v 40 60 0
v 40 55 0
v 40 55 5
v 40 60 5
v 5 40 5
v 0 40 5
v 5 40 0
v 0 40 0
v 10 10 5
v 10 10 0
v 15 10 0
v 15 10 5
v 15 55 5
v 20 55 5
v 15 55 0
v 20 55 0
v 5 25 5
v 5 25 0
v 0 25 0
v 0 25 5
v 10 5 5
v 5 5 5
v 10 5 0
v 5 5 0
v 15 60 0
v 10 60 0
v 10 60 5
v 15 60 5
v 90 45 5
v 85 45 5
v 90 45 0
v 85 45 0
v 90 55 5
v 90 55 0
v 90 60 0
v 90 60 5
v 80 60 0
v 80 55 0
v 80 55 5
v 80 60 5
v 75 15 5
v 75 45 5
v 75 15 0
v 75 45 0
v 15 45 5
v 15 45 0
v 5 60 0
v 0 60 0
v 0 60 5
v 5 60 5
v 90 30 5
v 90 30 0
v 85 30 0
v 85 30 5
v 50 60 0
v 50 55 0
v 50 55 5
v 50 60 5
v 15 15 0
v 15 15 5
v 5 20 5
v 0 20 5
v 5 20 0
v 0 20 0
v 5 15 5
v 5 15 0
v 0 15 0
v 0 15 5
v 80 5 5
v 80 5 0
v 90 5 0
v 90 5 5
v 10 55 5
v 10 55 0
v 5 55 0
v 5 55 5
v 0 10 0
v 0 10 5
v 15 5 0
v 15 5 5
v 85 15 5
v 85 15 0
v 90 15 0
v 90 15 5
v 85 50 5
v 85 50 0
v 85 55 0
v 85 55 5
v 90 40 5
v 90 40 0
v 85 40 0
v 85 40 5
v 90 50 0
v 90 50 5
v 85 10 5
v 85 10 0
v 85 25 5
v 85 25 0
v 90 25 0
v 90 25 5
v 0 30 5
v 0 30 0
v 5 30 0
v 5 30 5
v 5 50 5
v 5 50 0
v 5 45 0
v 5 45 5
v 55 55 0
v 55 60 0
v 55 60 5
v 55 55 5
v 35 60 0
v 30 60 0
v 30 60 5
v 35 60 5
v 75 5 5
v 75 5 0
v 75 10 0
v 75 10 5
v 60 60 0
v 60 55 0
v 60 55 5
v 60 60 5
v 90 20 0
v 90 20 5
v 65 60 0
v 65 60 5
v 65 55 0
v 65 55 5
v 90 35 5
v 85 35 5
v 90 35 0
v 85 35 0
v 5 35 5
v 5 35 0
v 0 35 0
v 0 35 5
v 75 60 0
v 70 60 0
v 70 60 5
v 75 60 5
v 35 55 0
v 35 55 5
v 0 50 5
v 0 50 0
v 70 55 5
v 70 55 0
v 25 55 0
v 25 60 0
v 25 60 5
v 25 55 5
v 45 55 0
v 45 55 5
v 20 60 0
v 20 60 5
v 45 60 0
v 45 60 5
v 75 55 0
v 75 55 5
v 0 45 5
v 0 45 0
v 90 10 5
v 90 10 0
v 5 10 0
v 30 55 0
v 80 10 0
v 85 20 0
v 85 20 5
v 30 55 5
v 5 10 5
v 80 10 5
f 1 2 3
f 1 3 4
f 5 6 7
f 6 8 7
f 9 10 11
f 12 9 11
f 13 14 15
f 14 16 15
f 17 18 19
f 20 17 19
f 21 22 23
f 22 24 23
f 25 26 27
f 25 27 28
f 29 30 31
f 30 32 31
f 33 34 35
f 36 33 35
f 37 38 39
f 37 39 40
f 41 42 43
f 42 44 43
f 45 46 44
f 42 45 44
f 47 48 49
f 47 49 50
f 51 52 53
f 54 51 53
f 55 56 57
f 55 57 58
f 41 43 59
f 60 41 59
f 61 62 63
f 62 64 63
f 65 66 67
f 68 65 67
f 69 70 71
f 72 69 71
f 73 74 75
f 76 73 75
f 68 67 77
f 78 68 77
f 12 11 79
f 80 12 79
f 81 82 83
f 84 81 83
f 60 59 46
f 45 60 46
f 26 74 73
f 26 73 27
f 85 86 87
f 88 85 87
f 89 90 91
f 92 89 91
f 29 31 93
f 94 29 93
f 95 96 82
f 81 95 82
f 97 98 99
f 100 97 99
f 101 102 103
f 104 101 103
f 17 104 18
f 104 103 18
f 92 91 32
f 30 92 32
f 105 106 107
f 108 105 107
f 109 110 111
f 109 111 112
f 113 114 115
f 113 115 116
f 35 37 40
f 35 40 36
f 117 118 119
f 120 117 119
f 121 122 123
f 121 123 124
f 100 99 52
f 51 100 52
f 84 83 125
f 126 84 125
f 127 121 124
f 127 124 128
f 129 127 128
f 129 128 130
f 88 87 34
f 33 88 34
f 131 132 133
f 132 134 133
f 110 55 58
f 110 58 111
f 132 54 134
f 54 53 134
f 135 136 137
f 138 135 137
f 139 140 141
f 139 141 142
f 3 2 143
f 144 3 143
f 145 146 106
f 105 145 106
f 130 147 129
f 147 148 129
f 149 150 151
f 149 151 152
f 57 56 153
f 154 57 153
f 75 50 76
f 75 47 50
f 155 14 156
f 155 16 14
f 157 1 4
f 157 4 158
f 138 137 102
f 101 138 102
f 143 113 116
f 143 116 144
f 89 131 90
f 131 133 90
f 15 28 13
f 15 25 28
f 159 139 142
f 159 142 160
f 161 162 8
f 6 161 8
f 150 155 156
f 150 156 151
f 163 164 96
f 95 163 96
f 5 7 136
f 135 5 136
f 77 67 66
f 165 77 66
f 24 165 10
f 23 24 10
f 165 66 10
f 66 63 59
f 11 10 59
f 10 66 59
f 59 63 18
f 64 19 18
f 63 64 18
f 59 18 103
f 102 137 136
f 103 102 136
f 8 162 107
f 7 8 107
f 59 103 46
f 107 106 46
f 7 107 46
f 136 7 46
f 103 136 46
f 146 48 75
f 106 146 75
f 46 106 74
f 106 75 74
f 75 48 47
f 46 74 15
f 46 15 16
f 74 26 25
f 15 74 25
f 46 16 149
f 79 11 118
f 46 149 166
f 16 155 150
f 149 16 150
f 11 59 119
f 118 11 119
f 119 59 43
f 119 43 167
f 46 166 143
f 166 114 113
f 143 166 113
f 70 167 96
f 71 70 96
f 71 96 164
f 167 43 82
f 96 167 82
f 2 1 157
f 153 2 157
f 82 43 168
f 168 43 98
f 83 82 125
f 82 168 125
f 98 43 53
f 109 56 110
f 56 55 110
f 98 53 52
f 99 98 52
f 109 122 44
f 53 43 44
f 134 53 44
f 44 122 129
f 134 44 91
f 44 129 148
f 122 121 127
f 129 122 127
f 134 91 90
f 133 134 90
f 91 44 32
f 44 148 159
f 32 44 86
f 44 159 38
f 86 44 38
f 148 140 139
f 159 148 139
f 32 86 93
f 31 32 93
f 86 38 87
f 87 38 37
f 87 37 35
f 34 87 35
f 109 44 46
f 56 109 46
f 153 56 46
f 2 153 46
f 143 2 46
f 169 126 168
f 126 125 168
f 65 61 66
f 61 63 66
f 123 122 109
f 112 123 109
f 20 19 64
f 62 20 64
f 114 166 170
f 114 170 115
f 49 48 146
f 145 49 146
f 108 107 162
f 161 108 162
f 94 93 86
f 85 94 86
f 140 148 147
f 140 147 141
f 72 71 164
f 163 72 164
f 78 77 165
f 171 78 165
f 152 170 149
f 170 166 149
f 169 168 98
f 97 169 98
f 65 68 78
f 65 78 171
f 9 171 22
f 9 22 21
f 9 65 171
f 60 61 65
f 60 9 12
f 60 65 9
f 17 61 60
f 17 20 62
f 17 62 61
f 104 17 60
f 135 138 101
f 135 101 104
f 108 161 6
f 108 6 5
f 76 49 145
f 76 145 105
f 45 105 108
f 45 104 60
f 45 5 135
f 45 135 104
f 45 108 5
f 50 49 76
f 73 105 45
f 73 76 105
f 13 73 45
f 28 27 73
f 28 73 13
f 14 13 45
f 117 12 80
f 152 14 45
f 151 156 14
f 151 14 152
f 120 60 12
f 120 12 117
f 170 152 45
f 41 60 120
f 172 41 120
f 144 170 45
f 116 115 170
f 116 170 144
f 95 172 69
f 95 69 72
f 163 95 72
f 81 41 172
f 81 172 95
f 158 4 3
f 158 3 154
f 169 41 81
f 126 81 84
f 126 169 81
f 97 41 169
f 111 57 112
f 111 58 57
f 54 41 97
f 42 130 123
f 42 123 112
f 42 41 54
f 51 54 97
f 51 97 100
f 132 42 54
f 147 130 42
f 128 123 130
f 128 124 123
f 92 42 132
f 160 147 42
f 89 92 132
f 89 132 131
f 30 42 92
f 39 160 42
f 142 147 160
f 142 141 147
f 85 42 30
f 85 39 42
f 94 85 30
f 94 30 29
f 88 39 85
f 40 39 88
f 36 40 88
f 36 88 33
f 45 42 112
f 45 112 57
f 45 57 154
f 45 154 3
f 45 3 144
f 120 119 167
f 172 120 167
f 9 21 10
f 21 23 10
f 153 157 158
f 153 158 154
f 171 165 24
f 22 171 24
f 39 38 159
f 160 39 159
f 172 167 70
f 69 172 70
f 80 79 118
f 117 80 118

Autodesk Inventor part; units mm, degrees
ref_plane "YZ Plane" through (0, 0, 0) normal (1, 0, 0) x (0, 1, 0)
ref_plane "XZ Plane" through (0, 0, 0) normal (0, 1, 0) x (-1, 0, 0)
ref_plane "XY Plane" through (0, 0, 0) normal (0, 0, 1) x (1, 0, 0)
sketch "Sketch1" plane through (0, 0, 0) normal (0, 0, 1) x (1, 0, 0)
  line L0 (5, 5) -> (85, 5)
  line L1 (85, 5) -> (85, 55)
  line L2 (85, 55) -> (5, 55)
  line L3 (5, 55) -> (5, 5)
  line L4 (0, 60) -> (5, 60)
  line L5 (5, 60) -> (5, 55)
  line L6 (5, 55) -> (0, 55)
  line L7 (0, 55) -> (0, 60)
  line L8 (0, 50) -> (5, 50)
  line L9 (5, 50) -> (5, 55)
  line L10 (5, 55) -> (0, 55)
  line L11 (0, 55) -> (0, 50)
  line L12 (5, 45) -> (0, 45)
  line L13 (0, 40) -> (5, 40)
  line L14 (5, 40) -> (5, 45)
  line L15 (5, 45) -> (0, 45)
  line L16 (0, 45) -> (0, 40)
  line L17 (5, 35) -> (0, 35)
  line L18 (0, 30) -> (5, 30)
  line L19 (5, 30) -> (5, 35)
  line L20 (5, 35) -> (0, 35)
  line L21 (0, 35) -> (0, 30)
  line L22 (5, 25) -> (0, 25)
  line L23 (0, 20) -> (5, 20)
  line L24 (5, 20) -> (5, 25)
  line L25 (5, 25) -> (0, 25)
  line L26 (0, 25) -> (0, 20)
  line L27 (5, 15) -> (0, 15)
  line L28 (0, 10) -> (5, 10)
  line L29 (5, 10) -> (5, 15)
  line L30 (5, 15) -> (0, 15)
  line L31 (0, 15) -> (0, 10)
  line L32 (15, 55) -> (10, 55)
  line L33 (15, 55) -> (10, 55)
  line L34 (10, 60) -> (15, 60)
  line L35 (10, 55) -> (10, 60)
  line L36 (15, 60) -> (15, 55)
  line L37 (25, 55) -> (20, 55)
  line L38 (25, 55) -> (20, 55)
  line L39 (20, 60) -> (25, 60)
  line L40 (20, 55) -> (20, 60)
  line L41 (25, 60) -> (25, 55)
  line L42 (35, 55) -> (30, 55)
  line L43 (35, 55) -> (30, 55)
  line L44 (30, 60) -> (35, 60)
  line L45 (30, 55) -> (30, 60)
  line L46 (35, 60) -> (35, 55)
  line L47 (45, 55) -> (40, 55)
  line L48 (45, 55) -> (40, 55)
  line L49 (40, 60) -> (45, 60)
  line L50 (40, 55) -> (40, 60)
  line L51 (45, 60) -> (45, 55)
  line L52 (55, 55) -> (50, 55)
  line L53 (55, 55) -> (50, 55)
  line L54 (50, 60) -> (55, 60)
  line L55 (50, 55) -> (50, 60)
  line L56 (55, 60) -> (55, 55)
  line L57 (65, 55) -> (60, 55)
  line L58 (65, 55) -> (60, 55)
  line L59 (60, 60) -> (65, 60)
  line L60 (60, 55) -> (60, 60)
  line L61 (65, 60) -> (65, 55)
  line L62 (75, 55) -> (70, 55)
  line L63 (75, 55) -> (70, 55)
  line L64 (70, 60) -> (75, 60)
  line L65 (70, 55) -> (70, 60)
  line L66 (75, 60) -> (75, 55)
  line L67 (85, 55) -> (80, 55)
  line L68 (85, 55) -> (80, 55)
  line L69 (80, 60) -> (85, 60)
  line L70 (80, 55) -> (80, 60)
  line L71 (85, 60) -> (85, 55)
  line L72 (90, 60) -> (85, 60)
  line L73 (85, 60) -> (85, 55)
  line L74 (85, 55) -> (90, 55)
  line L75 (90, 55) -> (90, 60)
  line L76 (90, 50) -> (85, 50)
  line L77 (85, 45) -> (90, 45)
  line L78 (90, 45) -> (90, 50)
  line L79 (90, 40) -> (85, 40)
  line L80 (85, 35) -> (90, 35)
  line L81 (90, 35) -> (90, 40)
  line L82 (90, 30) -> (85, 30)
  line L83 (85, 25) -> (90, 25)
  line L84 (90, 25) -> (90, 30)
  line L85 (90, 20) -> (85, 20)
  line L86 (85, 15) -> (90, 15)
  line L87 (90, 15) -> (90, 20)
  line L88 (90, 10) -> (85, 10)
  line L89 (85, 5) -> (90, 5)
  line L90 (90, 5) -> (90, 10)
  line L91 (10, 10) -> (15, 10)
  line L92 (15, 10) -> (15, 5)
  line L93 (15, 5) -> (10, 5)
  line L94 (10, 5) -> (10, 10)
  line L95 (75, 10) -> (80, 10)
  line L96 (80, 10) -> (80, 5)
  line L97 (80, 5) -> (75, 5)
  line L98 (75, 5) -> (75, 10)
  line L99 (15, 45) -> (75, 45)
  line L100 (75, 45) -> (75, 15)
  line L101 (75, 15) -> (15, 15)
  line L102 (15, 15) -> (15, 45)
  point P0 (0, 0)
  point P1 (10, 50)
  point P2 (20, 50)
  point P3 (30, 50)
  point P4 (40, 50)
  point P5 (50, 50)
  point P6 (60, 50)
  point P7 (70, 50)
  point P8 (80, 50)
  dimension "d2" = 10
  dimension "d9" = 10
  dimension "d16" = 10
extrude "Extrusion1" add sketch "Sketch1" along normal blind 5 contours L3 L2 L1 L0 L96 L95 L98 L92 L91 L94 | L28 L31 L27 L3 | L23 L26 L22 L3 | L1 L88 L90 L89 | L18 L21 L17 L3 | L1 L85 L87 L86 | L13 L16 L12 L3 | L1 L82 L84 L83 | L8 L11 L6 L3 | L6 L7 L4 L5 | L1 L79 L81 L80 | L35 L34 L36 L2 | L1 L76 L78 L77 | L40 L39 L41 L2 | L2 L70 L69 L71 | L71 L72 L75 L74 | L45 L44 L46 L2 | L2 L65 L64 L66 | L50 L49 L51 L2 | L2 L60 L59 L61 | L55 L54 L56 L2
properties part number "leftrightsidehole"
